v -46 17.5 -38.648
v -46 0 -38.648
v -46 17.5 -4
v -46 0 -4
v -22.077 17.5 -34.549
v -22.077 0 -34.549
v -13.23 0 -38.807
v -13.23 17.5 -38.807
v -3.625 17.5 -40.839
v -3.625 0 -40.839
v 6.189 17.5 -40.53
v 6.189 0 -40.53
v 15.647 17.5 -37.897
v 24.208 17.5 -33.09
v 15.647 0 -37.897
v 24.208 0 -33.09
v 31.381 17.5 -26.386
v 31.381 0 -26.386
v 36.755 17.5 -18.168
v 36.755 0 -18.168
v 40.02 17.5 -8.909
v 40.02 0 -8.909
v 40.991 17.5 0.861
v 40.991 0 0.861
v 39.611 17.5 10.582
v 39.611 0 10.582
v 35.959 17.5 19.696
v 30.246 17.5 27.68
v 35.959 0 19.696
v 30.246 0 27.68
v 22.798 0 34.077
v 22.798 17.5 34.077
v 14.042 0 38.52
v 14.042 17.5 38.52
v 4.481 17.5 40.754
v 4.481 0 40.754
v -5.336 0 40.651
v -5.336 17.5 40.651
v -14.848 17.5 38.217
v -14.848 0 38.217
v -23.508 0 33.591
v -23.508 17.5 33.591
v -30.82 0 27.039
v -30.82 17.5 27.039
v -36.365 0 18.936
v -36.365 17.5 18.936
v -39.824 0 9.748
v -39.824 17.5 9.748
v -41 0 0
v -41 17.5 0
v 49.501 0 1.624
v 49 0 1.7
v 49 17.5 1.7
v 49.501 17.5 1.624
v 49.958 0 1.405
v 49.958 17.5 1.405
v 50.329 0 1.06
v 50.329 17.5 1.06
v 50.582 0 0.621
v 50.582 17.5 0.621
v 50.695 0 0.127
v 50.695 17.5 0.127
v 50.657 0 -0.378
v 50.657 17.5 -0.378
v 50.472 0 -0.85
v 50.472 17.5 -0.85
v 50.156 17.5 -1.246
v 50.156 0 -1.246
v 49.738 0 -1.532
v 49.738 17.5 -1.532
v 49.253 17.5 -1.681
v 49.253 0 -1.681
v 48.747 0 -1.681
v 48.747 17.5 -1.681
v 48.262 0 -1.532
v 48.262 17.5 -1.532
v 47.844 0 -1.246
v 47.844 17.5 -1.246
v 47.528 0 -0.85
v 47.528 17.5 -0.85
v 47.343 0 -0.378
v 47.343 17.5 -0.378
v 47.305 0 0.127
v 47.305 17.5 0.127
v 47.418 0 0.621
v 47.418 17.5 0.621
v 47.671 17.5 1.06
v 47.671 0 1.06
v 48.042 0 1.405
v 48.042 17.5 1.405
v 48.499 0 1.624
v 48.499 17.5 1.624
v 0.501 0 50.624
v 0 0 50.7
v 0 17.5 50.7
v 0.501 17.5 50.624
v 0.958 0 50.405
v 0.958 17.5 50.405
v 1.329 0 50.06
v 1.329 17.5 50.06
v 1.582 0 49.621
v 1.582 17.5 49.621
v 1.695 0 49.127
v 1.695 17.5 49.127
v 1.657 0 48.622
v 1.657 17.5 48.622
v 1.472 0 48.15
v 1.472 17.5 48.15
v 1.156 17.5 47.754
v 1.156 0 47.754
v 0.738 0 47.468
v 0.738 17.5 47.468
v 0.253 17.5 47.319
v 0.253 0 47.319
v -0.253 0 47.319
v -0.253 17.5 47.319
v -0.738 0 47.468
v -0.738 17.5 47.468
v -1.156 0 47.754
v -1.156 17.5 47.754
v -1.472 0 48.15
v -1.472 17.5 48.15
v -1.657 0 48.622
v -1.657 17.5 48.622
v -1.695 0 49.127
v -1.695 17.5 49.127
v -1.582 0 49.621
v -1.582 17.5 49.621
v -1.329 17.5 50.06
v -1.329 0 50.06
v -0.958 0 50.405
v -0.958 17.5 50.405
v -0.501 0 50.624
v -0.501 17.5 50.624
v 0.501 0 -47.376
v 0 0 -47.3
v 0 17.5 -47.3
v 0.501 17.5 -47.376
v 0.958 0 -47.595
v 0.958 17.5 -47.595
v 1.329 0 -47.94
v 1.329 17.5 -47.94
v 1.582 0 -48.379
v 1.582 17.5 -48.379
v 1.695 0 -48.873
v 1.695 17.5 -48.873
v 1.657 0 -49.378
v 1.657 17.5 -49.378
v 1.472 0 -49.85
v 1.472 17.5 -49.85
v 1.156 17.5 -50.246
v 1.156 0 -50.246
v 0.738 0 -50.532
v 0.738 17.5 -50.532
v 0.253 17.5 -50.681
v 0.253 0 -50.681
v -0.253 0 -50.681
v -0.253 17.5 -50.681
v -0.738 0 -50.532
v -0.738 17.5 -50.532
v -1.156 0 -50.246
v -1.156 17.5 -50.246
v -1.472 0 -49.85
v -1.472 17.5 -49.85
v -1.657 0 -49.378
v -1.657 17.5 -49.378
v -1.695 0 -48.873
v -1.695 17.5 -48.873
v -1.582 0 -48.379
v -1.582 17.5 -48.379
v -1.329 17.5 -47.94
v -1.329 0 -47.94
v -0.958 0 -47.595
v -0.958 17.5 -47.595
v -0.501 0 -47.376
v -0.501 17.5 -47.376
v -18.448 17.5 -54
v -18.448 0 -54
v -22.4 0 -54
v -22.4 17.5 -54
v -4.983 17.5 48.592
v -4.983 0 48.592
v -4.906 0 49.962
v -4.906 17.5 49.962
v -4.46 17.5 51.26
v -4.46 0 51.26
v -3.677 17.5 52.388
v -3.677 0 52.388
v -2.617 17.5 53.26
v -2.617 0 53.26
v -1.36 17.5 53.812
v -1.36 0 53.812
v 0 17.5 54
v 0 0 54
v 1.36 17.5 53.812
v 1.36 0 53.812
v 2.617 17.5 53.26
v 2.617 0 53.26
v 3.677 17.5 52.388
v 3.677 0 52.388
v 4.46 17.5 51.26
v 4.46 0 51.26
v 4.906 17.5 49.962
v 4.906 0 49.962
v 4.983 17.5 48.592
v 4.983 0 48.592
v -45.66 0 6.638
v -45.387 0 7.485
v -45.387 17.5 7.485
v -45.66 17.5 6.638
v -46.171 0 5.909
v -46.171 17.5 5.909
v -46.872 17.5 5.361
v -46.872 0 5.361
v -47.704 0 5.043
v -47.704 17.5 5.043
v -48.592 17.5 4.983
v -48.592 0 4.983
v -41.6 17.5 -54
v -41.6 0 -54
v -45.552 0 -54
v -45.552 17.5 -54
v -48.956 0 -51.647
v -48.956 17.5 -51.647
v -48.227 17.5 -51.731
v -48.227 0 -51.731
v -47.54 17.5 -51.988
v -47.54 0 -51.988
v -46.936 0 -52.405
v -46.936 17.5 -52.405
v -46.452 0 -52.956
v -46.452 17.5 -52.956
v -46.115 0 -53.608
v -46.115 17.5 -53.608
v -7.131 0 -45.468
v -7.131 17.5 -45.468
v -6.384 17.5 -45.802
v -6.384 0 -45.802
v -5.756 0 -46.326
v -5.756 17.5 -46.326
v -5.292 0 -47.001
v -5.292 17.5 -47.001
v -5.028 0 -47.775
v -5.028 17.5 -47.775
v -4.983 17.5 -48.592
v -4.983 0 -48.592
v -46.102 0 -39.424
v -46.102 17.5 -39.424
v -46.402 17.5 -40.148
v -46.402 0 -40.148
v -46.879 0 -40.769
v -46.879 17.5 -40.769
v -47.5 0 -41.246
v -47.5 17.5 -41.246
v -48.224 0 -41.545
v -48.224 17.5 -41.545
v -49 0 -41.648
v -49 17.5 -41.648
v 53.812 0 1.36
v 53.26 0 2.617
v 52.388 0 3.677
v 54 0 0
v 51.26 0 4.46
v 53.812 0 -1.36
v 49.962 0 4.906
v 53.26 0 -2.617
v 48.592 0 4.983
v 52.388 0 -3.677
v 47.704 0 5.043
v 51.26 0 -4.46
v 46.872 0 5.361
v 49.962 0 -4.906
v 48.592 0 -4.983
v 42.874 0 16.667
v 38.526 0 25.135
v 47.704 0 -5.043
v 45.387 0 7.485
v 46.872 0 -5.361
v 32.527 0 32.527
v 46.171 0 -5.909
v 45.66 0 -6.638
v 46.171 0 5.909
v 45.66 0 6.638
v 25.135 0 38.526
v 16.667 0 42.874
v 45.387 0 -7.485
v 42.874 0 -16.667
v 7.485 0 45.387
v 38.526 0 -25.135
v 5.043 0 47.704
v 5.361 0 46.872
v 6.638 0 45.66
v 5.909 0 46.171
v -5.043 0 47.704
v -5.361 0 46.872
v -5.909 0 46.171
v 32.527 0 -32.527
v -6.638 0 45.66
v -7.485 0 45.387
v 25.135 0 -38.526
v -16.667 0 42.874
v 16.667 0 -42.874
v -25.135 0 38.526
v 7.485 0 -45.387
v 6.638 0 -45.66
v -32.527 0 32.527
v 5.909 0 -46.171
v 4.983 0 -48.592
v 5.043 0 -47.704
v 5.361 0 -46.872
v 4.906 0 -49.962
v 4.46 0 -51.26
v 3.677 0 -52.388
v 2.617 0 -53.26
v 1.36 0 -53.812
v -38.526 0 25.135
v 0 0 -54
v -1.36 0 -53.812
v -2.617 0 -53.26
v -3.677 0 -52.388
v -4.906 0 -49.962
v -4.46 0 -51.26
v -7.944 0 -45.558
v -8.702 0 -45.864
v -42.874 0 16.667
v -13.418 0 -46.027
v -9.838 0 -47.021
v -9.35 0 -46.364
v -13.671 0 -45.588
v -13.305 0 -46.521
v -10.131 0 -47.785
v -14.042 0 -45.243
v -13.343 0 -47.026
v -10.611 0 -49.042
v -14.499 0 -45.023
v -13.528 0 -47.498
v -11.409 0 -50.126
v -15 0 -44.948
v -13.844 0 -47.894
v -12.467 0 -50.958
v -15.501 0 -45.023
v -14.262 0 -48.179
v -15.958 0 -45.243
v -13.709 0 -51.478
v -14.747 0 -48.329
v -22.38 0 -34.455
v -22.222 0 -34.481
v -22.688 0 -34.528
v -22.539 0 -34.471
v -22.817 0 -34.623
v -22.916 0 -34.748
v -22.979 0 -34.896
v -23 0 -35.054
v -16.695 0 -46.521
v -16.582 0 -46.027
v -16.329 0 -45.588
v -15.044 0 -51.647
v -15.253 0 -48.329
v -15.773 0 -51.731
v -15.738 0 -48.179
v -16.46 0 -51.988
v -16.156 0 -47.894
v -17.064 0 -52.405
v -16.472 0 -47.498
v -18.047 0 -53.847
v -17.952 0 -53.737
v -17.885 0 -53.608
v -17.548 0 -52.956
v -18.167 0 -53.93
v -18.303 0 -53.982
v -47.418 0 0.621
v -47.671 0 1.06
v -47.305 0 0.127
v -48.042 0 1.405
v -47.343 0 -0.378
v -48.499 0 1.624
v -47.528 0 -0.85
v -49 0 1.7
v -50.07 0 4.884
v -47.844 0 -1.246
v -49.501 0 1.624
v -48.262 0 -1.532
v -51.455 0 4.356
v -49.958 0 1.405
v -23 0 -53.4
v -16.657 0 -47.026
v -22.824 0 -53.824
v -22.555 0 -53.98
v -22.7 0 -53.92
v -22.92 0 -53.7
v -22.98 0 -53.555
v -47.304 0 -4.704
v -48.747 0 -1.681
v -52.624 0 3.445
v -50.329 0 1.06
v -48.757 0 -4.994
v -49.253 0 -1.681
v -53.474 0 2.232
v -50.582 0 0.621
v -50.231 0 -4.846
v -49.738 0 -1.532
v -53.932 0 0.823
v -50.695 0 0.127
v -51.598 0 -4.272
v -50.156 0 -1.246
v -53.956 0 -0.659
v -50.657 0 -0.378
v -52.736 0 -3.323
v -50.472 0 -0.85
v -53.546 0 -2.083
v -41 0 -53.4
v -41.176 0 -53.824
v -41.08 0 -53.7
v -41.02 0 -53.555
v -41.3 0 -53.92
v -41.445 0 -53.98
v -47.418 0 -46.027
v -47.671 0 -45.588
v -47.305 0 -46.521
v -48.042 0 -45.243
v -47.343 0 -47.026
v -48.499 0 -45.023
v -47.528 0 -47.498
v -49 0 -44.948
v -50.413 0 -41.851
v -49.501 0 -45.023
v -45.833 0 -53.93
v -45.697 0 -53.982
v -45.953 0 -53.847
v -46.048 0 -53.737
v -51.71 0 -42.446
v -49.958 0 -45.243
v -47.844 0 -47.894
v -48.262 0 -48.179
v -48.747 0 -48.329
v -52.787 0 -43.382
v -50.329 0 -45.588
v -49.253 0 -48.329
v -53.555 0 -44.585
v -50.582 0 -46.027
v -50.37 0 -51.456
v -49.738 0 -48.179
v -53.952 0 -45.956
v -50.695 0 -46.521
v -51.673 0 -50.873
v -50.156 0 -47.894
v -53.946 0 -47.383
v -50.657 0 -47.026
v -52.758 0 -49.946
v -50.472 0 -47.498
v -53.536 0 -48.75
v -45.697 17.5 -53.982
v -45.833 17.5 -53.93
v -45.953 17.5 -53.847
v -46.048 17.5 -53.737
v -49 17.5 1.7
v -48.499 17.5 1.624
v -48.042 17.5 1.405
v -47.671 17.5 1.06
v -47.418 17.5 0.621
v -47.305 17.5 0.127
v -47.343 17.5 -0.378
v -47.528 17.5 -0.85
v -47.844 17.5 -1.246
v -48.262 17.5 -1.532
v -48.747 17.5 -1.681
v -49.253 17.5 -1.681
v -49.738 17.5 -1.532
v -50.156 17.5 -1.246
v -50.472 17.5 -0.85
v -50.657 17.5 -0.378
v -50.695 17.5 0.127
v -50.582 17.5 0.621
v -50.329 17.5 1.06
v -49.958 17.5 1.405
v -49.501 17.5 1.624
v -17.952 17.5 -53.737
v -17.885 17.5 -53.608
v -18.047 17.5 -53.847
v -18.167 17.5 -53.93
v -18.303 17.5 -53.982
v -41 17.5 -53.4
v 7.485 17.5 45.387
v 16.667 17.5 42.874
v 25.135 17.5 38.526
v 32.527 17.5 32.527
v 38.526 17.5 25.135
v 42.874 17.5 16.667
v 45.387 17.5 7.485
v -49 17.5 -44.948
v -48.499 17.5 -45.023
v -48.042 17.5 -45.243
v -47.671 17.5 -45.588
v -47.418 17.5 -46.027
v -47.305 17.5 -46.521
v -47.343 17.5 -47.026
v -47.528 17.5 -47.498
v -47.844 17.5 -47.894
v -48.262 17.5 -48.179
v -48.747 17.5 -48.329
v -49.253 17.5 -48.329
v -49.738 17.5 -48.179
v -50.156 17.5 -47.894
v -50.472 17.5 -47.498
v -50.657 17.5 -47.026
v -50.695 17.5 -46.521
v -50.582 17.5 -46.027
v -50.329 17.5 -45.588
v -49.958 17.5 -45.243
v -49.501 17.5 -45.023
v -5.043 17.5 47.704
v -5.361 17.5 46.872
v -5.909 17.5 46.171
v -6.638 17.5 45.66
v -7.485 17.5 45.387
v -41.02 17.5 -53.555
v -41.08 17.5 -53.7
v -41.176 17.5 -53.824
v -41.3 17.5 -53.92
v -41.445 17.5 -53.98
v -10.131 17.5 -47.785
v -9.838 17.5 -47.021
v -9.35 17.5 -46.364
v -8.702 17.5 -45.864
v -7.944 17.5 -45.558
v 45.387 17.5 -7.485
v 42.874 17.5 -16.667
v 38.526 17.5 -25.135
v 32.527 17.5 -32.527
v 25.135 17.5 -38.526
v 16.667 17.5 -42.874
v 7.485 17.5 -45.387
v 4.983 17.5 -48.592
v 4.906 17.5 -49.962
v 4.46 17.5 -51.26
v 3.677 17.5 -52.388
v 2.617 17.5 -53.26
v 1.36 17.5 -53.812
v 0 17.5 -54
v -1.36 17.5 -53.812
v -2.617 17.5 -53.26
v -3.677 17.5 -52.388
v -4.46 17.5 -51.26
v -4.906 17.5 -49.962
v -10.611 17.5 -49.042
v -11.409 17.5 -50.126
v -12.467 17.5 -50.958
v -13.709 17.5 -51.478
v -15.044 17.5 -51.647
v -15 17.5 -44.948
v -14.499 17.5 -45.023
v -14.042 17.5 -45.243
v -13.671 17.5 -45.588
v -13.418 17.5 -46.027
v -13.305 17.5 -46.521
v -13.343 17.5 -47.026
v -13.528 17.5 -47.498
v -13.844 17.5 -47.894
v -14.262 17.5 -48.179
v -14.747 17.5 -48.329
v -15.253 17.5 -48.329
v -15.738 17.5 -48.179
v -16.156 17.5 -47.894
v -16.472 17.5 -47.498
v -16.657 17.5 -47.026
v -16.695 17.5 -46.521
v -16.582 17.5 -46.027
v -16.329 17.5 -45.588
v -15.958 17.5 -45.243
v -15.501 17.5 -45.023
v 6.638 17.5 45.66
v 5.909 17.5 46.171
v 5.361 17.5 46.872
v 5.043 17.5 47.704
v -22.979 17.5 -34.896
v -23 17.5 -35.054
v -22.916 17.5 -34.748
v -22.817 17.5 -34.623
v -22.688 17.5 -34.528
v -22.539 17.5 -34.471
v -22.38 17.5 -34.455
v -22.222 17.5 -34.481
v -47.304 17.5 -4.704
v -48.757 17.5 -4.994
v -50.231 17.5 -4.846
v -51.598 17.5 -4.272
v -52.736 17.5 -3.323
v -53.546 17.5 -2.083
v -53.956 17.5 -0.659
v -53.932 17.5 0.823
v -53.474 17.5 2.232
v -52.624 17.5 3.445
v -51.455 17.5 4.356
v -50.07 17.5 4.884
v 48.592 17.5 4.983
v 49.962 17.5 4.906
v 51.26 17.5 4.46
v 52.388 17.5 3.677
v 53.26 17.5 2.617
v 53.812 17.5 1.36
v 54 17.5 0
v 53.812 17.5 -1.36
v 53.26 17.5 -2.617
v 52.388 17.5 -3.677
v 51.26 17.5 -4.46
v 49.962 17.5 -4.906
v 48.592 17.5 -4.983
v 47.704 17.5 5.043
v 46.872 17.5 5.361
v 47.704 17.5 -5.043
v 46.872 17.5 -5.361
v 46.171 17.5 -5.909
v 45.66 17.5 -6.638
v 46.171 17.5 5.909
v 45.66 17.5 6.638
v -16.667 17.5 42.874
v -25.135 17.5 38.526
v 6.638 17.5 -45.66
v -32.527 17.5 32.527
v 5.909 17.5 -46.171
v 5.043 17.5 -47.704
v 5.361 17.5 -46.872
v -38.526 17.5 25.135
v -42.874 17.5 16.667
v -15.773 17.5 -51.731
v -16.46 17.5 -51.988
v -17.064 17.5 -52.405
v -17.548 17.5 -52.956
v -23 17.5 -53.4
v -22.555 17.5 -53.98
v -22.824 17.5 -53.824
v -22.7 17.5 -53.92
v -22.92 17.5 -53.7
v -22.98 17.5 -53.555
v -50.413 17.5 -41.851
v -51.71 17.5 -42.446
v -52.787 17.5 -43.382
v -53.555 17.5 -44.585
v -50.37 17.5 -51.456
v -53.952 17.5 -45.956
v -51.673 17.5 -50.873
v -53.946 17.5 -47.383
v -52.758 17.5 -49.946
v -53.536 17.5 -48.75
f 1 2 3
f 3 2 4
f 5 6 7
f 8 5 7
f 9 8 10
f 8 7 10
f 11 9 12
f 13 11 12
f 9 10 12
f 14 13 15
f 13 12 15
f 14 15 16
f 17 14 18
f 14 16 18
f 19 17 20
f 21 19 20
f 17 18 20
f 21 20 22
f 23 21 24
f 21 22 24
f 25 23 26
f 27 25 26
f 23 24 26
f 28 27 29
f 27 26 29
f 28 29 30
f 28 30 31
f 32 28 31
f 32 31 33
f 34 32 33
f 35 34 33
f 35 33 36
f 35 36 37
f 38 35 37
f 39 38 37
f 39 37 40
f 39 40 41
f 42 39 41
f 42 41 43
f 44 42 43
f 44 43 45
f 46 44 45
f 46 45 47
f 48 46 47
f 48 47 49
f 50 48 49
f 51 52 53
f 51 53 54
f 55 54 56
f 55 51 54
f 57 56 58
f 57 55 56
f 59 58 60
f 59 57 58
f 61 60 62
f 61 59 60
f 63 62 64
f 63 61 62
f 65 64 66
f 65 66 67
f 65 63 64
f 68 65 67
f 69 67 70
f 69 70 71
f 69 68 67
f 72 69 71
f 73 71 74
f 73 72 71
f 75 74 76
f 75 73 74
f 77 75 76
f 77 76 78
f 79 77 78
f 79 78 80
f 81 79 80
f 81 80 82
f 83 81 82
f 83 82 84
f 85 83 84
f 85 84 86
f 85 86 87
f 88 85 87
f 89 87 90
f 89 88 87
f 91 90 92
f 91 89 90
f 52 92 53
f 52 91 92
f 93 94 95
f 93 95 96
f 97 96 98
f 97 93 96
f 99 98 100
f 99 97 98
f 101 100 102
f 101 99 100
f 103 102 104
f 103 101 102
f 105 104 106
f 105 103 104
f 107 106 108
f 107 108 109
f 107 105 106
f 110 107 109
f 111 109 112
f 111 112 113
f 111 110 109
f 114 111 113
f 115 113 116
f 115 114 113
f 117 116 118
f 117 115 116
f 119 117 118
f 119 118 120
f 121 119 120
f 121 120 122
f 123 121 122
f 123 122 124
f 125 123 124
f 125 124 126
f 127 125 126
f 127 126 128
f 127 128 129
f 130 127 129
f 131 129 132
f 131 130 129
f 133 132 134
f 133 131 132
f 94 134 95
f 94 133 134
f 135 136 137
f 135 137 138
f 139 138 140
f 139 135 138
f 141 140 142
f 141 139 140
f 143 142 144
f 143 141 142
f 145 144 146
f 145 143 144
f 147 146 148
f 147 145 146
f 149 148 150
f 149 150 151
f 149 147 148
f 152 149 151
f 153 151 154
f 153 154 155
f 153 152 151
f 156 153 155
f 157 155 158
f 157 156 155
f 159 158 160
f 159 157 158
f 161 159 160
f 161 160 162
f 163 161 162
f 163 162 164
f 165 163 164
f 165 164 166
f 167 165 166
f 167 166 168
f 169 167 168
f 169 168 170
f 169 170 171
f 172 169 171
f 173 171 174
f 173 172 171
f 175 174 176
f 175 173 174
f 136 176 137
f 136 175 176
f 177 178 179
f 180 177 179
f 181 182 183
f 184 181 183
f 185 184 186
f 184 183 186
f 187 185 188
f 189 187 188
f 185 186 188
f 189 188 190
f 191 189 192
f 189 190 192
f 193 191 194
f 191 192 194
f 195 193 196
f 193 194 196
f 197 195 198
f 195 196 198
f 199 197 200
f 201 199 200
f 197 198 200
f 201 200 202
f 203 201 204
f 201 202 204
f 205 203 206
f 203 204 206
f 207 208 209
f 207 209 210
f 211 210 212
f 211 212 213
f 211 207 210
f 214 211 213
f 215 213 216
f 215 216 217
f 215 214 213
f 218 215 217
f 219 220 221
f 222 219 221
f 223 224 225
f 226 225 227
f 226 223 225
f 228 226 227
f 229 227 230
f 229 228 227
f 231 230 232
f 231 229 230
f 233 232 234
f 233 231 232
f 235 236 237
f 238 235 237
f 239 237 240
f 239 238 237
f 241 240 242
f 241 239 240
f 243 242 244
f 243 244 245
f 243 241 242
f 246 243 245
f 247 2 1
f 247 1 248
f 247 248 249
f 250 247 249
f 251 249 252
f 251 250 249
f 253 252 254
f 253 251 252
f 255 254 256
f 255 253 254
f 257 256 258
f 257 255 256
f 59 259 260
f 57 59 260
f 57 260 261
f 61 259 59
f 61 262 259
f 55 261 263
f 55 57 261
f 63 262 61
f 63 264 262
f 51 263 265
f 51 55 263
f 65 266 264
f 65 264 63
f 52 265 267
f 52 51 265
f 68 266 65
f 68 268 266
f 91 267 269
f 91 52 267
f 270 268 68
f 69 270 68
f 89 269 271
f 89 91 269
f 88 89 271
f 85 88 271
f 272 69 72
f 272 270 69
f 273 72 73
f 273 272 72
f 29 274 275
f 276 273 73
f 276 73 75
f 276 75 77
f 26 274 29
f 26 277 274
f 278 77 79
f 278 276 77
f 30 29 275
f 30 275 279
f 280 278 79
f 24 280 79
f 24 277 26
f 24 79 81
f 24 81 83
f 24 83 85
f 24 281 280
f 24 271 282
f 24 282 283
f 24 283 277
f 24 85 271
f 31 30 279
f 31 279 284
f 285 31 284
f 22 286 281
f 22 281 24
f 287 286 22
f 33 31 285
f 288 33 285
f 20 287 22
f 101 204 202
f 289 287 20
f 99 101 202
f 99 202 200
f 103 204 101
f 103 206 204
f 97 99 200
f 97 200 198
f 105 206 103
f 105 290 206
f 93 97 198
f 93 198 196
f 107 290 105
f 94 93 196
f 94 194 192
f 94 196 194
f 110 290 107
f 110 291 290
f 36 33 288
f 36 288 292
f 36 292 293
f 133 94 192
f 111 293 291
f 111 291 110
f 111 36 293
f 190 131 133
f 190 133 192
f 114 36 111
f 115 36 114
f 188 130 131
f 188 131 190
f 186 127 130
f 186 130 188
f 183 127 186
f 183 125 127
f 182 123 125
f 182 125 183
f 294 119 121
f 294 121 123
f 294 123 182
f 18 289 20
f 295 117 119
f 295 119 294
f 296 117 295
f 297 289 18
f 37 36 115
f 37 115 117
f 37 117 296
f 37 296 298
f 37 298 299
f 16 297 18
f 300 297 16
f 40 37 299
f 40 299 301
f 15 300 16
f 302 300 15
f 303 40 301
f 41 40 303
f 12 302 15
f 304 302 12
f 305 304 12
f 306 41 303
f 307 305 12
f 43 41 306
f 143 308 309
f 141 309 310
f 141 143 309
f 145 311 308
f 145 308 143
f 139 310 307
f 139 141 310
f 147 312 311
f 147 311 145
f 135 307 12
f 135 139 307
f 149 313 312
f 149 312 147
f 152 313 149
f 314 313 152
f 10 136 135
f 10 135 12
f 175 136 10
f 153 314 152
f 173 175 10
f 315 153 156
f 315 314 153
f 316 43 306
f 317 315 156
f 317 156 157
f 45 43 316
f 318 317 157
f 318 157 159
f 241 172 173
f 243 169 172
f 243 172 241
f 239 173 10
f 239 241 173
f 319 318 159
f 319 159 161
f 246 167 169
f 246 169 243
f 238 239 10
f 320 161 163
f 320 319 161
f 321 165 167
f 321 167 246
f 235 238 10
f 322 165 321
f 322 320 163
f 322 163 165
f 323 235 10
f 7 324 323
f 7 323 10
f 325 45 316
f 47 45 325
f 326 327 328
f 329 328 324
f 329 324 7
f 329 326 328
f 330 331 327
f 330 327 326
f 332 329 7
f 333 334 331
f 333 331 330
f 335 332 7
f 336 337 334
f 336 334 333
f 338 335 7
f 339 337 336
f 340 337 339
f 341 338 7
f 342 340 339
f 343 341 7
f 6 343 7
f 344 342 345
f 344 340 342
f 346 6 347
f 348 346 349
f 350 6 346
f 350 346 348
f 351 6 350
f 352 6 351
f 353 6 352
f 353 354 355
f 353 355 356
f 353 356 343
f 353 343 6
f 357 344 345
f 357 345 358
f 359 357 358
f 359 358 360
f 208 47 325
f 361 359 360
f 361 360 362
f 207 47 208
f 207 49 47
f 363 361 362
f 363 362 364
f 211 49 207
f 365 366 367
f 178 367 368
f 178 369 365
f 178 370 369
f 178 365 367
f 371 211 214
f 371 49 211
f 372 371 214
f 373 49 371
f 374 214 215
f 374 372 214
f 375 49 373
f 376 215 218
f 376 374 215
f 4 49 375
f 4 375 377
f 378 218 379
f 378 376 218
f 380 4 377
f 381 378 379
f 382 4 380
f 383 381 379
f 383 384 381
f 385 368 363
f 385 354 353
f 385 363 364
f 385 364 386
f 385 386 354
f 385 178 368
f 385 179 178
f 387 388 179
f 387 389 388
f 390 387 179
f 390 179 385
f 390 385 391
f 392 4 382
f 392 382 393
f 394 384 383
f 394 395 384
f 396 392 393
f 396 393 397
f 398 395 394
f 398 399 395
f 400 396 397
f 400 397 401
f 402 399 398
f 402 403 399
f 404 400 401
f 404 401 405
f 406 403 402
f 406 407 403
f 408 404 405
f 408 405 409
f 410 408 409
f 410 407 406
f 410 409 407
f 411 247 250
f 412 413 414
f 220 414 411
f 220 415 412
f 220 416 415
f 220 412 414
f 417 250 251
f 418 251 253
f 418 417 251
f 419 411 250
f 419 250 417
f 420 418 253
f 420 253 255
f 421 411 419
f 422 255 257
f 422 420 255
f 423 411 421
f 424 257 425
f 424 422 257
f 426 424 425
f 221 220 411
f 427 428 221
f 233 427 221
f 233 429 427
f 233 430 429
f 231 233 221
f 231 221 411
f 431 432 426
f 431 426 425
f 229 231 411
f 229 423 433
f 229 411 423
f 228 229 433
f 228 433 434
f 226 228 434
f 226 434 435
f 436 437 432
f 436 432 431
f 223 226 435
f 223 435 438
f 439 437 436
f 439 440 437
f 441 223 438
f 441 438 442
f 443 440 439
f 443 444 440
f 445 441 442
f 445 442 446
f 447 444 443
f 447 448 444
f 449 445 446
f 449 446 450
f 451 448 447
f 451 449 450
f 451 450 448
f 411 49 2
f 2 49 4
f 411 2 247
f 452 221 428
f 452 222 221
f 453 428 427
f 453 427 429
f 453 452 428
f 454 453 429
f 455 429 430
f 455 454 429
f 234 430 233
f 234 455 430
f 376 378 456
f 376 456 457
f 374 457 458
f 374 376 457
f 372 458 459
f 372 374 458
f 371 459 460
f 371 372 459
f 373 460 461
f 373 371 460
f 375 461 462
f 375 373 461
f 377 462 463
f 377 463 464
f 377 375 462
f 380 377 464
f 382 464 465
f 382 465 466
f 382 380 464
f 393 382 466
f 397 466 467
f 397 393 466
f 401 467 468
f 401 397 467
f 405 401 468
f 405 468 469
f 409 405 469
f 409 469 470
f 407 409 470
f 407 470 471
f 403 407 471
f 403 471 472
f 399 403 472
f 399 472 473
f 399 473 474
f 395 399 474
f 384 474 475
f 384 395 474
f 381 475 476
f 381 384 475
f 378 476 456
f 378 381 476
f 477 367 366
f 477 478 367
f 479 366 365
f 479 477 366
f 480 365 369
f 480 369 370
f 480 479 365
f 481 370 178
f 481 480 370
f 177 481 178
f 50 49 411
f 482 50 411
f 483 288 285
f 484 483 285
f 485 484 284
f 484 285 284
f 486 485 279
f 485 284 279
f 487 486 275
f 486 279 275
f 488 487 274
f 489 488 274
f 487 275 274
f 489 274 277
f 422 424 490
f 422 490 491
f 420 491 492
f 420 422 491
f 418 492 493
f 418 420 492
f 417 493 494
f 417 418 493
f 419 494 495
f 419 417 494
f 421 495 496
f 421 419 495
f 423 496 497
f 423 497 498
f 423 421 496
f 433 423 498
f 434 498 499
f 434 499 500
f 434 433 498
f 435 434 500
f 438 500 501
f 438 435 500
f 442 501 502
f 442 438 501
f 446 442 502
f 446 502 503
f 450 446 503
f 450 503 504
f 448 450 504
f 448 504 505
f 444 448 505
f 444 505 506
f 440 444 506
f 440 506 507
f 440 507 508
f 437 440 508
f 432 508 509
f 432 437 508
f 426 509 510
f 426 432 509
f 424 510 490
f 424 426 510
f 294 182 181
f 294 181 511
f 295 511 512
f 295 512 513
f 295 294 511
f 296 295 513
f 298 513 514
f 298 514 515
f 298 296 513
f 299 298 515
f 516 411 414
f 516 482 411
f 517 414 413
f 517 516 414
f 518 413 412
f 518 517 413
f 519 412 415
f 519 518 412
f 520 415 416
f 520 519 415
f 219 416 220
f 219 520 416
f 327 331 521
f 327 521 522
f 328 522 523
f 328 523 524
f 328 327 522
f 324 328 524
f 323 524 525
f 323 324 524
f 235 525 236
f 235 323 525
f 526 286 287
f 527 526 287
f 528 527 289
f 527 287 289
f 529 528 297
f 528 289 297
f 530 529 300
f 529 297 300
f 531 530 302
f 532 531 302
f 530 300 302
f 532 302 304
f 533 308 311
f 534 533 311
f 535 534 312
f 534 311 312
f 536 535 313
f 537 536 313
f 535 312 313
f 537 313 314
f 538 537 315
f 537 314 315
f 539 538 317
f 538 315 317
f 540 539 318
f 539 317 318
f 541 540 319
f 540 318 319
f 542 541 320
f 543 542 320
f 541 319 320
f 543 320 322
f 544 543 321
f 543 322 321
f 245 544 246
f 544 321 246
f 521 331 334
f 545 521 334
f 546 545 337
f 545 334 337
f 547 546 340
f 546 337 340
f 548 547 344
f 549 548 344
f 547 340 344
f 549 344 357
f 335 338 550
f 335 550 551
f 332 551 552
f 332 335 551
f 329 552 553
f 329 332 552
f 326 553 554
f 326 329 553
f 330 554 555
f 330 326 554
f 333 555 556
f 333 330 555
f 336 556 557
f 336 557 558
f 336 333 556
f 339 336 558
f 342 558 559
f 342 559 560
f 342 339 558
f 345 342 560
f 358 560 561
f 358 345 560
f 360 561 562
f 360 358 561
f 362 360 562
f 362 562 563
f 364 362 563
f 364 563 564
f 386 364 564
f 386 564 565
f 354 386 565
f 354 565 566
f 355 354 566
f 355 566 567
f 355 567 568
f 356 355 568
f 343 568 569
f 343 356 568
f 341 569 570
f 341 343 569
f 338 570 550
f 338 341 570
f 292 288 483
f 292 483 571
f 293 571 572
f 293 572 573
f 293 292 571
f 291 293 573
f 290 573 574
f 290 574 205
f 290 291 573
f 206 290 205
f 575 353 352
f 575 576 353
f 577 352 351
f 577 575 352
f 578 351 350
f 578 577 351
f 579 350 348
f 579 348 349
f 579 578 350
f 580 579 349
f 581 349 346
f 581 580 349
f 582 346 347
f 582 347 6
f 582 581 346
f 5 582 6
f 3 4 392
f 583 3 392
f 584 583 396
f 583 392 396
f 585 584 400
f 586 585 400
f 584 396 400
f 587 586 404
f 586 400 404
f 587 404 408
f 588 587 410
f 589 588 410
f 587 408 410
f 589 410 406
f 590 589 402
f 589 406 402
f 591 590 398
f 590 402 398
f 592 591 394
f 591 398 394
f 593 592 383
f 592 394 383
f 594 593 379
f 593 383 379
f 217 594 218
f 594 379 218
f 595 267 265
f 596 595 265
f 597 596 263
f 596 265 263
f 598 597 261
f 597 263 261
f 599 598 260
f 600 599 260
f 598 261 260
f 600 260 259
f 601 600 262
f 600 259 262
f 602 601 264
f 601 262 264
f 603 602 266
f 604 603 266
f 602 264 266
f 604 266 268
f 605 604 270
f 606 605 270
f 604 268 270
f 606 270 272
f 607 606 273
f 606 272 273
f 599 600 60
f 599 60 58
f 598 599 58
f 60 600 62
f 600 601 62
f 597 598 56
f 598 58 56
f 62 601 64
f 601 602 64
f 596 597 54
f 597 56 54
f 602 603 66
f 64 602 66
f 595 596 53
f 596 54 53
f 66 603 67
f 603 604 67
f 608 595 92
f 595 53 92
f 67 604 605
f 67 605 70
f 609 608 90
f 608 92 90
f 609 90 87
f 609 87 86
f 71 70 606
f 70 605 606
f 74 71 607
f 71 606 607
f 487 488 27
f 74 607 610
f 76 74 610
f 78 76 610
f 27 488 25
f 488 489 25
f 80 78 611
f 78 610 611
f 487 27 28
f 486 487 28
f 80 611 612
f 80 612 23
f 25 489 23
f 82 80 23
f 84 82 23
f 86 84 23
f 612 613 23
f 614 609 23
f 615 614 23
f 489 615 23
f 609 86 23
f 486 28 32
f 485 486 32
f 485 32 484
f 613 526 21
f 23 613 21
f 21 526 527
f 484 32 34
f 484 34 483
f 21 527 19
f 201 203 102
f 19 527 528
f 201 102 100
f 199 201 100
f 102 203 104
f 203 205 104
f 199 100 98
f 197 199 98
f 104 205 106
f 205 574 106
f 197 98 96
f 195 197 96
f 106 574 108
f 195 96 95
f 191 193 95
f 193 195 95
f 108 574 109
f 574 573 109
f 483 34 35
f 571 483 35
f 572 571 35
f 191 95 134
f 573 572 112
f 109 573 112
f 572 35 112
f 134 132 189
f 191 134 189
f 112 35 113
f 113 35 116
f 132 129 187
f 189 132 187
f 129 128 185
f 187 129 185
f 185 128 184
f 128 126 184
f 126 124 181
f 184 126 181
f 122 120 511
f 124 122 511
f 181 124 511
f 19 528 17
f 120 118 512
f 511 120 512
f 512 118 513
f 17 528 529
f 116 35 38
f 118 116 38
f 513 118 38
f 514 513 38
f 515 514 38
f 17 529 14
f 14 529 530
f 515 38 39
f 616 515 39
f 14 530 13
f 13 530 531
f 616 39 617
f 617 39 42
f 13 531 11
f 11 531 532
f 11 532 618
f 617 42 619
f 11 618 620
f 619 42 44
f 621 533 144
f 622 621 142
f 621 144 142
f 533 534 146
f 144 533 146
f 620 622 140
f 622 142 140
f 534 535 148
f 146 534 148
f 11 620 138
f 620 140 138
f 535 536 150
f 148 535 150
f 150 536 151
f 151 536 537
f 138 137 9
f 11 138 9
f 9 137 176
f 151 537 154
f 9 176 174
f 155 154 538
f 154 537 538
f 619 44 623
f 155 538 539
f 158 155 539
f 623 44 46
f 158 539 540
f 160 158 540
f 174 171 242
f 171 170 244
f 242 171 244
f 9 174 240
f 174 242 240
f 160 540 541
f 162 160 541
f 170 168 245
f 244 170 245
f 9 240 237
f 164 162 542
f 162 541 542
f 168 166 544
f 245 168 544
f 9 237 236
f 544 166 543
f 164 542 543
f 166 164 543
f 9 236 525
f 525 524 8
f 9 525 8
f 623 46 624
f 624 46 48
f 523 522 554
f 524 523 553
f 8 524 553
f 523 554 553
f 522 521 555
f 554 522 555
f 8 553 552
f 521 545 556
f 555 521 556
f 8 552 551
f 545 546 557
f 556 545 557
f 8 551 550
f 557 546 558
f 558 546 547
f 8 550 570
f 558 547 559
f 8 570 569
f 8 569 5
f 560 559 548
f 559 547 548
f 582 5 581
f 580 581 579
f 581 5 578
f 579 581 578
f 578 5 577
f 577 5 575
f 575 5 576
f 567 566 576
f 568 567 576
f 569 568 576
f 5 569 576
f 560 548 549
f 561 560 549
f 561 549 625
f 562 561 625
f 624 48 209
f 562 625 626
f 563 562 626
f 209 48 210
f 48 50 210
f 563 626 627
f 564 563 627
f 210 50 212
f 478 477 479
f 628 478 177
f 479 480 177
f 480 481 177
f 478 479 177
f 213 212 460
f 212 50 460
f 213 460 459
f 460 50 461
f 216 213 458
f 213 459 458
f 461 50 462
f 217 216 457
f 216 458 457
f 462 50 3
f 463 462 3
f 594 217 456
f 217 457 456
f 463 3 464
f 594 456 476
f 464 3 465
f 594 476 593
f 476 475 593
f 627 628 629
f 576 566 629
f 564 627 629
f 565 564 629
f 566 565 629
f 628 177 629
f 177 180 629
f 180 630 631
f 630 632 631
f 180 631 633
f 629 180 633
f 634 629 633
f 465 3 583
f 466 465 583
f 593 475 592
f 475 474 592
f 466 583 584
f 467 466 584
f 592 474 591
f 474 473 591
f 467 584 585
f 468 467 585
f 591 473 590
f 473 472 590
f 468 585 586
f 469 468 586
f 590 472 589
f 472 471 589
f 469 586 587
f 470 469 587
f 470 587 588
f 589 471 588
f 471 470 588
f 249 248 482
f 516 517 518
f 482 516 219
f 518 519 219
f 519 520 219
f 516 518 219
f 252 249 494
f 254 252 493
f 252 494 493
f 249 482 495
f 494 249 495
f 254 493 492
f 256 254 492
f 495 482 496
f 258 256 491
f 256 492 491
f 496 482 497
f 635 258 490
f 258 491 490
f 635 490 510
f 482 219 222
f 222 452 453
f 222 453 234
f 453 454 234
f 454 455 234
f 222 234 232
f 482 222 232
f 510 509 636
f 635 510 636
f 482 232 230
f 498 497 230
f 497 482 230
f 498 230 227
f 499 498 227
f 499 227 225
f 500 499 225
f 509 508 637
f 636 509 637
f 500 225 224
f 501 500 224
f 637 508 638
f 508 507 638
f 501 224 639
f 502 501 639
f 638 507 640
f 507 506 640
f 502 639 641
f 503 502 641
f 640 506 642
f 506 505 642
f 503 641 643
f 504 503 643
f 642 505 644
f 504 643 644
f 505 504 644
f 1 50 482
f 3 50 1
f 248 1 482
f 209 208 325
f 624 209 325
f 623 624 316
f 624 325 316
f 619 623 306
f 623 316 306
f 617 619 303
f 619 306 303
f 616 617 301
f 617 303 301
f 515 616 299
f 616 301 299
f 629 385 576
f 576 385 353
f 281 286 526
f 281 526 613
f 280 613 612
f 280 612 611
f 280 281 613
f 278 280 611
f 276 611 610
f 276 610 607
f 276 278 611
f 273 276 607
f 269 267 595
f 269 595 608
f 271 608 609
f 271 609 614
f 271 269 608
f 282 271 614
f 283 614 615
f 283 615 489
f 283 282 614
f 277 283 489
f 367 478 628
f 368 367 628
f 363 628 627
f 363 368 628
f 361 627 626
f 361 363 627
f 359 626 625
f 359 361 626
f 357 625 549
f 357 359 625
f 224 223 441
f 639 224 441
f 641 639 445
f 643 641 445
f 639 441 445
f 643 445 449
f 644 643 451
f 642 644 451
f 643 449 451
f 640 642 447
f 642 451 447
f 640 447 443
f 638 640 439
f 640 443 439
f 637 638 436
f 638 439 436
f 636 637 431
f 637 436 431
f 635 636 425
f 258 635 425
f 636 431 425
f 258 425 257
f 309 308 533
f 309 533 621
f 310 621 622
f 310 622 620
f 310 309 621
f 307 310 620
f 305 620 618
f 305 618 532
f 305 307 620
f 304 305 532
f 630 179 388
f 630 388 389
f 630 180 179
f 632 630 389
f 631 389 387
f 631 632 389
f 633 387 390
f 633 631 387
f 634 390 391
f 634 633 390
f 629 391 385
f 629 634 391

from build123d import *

# Parameters (mm, degrees)
SKETCH_1_R      = 1.7
EXTRUDE_1_DEPTH = 17.5
FILLET_1_R      = 3
FILLET_2_R      = 0.6


with BuildPart() as part:
    # 草图1 → 凸台-拉伸1 (new body)
    with BuildSketch(Plane(origin=(0, 0, 0), x_dir=(1, 0, 0), z_dir=(0, 1, 0))):
        with BuildLine():
            Line((-41, 0), (-41, 54))
            Line((-41, 54), (-46, 54))
            Line((-46, 54), (-46, 50.647615159))
            ThreePointArc((-46, 50.647615159), (-54, 46.647615159), (-46, 42.647615159))
            Line((-46, 42.647615159), (-46, 4))
            ThreePointArc((-46, 4), (-53.998925026, -0.103675394), (-45.836734694, -3.872176727))
            ThreePointArc((-45.836734694, -3.872176727), (-32.526911935, -32.526911935), (-3.872176727, -45.836734694))
            ThreePointArc((-3.872176727, -45.836734694), (0, -54), (3.872176727, -45.836734694))
            ThreePointArc((3.872176727, -45.836734694), (32.526911935, -32.526911935), (45.836734694, -3.872176727))
            ThreePointArc((45.836734694, -3.872176727), (54, 0), (45.836734694, 3.872176727))
            ThreePointArc((45.836734694, 3.872176727), (32.526911935, 32.526911935), (3.872176727, 45.836734694))
            ThreePointArc((3.872176727, 45.836734694), (0, 54), (-3.872176727, 45.836734694))
            ThreePointArc((-3.872176727, 45.836734694), (-7.126872346, 45.444556226), (-10.345371646, 44.821571654))
            ThreePointArc((-10.345371646, 44.821571654), (-11.971775359, 50.626290255), (-18, 50.647615159))
            Line((-18, 50.647615159), (-18, 54))
            Line((-18, 54), (-23, 54))
            Line((-23, 54), (-23, 33.941125497))
            ThreePointArc((-23, 33.941125497), (36.221540553, -19.209372712), (-41, 0))
        make_face()
        with Locations(Location((0, 49, 0), (0, 0, 270))):
            Circle(SKETCH_1_R, mode=Mode.SUBTRACT)
        with Locations(Location((49, 0, 0), (0, 0, 270))):
            Circle(SKETCH_1_R, mode=Mode.SUBTRACT)
        with Locations(Location((0, -49, 0), (0, 0, 270))):
            Circle(SKETCH_1_R, mode=Mode.SUBTRACT)
        with Locations(Location((-49, 0, 0), (0, 0, 270))):
            Circle(SKETCH_1_R, mode=Mode.SUBTRACT)
        with Locations(Location((-15, 46.647615159, 0), (0, 0, 270))):
            Circle(SKETCH_1_R, mode=Mode.SUBTRACT)
        with Locations(Location((-49, 46.647615159, 0), (0, 0, 270))):
            Circle(SKETCH_1_R, mode=Mode.SUBTRACT)
    extrude(amount=EXTRUDE_1_DEPTH)

    # 圆角1
    # the kernel refuses this fillet: 3 mm, written as the material it adds along each edge
    with BuildSketch(Plane(origin=(-3.872176727, 0, -45.836734694), x_dir=(-0.37402840247840613, 0, -0.9274172492138861), z_dir=(0, 1, 0)), Plane(origin=(45.836734694, 0, -3.872176727), x_dir=(0.9274172492138857, 0, -0.37402840247840763), z_dir=(0, 1, 0)), Plane(origin=(3.872176727, 0, 45.836734694), x_dir=(0.374028402478409, 0, 0.9274172492138849), z_dir=(0, 1, 0)), Plane(origin=(-45.836734694, 0, 3.872176727), x_dir=(-0.9274172492138864, 0, 0.3740284024784056), z_dir=(0, 1, 0))) as fillet_1_piece_1:
        with BuildLine():
            CenterArc((3.861943107, 2.864564734), FILLET_1_R, 167.400558819, 85.317583138)
            Line((0.934186439, 3.518965904), (0.875631305, 3.532053927))
            ThreePointArc((0.875631305, 3.532053927), (0.44393089, 1.765631899), (-0.057336629, 0.017677979))
            Line((-0.057336629, 0.017677979), (0.017824353, -0.057291295))
            ThreePointArc((0.017824353, -0.057291295), (1.485362734, 0.165725443), (2.952901114, -0.057291295))
            Line((2.952901114, -0.057291295), (2.970725467, 0))
        make_face()
    extrude(amount=17.5)
    with BuildSketch(Plane(origin=(3.872176727, 0, -45.836734694), x_dir=(0.9923388633046951, 0, 0.12354586344813656), z_dir=(0, 1, 0)), Plane(origin=(45.836734694, 0, 3.872176727), x_dir=(-0.12354586344813612, 0, 0.9923388633046951), z_dir=(0, 1, 0)), Plane(origin=(-3.872176727, 0, 45.836734694), x_dir=(-0.9923388633046952, 0, -0.12354586344813587), z_dir=(0, 1, 0)), Plane(origin=(-10.345371646, 0, -44.821571654), x_dir=(0.982518966413127, 0, -0.18616251136703332), z_dir=(0, 1, 0))) as fillet_1_piece_2:
        with BuildLine():
            CenterArc((3.759578561, 2.997649867), FILLET_1_R, 182.41437212, 85.317583138)
            Line((0.762241678, 2.871271047), (0.70229494, 2.868743471))
            ThreePointArc((0.70229494, 2.868743471), (0.541298099, 1.393112968), (-0.050799838, 0.031927676))
            Line((-0.050799838, 0.031927676), (0.002374471, -0.059952997))
            ThreePointArc((0.002374471, -0.059952997), (1.820427514, -0.023964621), (3.638480557, -0.059952997))
            Line((3.638480557, -0.059952997), (3.640855028, 0))
        make_face()
    extrude(amount=17.5)
    with BuildSketch(Plane(origin=(-46, 0, -42.647615159), x_dir=(-0.9486832980505127, 0, 0.31622776601684127), z_dir=(0, 1, 0))) as fillet_1_piece_3:
        with BuildLine():
            CenterArc((4.110960958, 2.846049894), FILLET_1_R, 161.565051177, 90)
            Line((1.264911064, 3.794733192), (1.207990066, 3.813706858))
            Line((1.207990066, 3.813706858), (-0.056920998, 0.018973666))
            Line((-0.056920998, 0.018973666), (0.018973666, -0.056920998))
            ThreePointArc((0.018973666, -0.056920998), (1.58113883, 0.19658351), (3.143303994, -0.056920998))
            Line((3.143303994, -0.056920998), (3.16227766, 0))
        make_face()
    extrude(amount=17.5)
    with BuildSketch(Plane(origin=(-46, 0, -50.647615159), x_dir=(1.5090941279718801e-12, 0, -1.0), z_dir=(0, 1, 0))) as fillet_1_piece_4:
        with BuildLine():
            CenterArc((3.99968789, 2.929334184), FILLET_1_R, 179.493886793, 78.04554374)
            Line((0.999804931, 2.955833865), (0.939807272, 2.956363859))
            ThreePointArc((0.939807272, 2.956363859), (0.679550236, 1.417151431), (-0.048, 0.036))
            Line((-0.048, 0.036), (0, -0.06))
            ThreePointArc((0, -0.06), (1.676192421, -0.06), (3.33943878, -0.058586684))
            Line((3.33943878, -0.058586684), (3.352384841, 0))
        make_face()
    extrude(amount=17.5)
    with BuildSketch(Plane(origin=(-18, 0, -50.647615159), x_dir=(0.9472773756522823, 0, -0.3204146900148692), z_dir=(0, 1, 0))) as fillet_1_piece_5:
        with BuildLine():
            CenterArc((4.056450754, 2.850212144), FILLET_1_R, 173.772564041, 78.04554374)
            Line((1.07415335, 3.175638315), (1.014507402, 3.182146838))
            ThreePointArc((1.014507402, 3.182146838), (0.480240032, 1.607044039), (-0.056836643, 0.019224881))
            Line((-0.056836643, 0.019224881), (0.01872208, -0.057004243))
            ThreePointArc((0.01872208, -0.057004243), (1.560173367, 0.189646427), (3.101624653, -0.057004243))
            Line((3.101624653, -0.057004243), (3.120346734, 0))
        make_face()
    extrude(amount=17.5)

    # 圆角2
    fillet_2_edges = [part.edges().sort_by_distance(p)[0] for p in [
        (-46, 8.75, -54),
        (-41, 8.75, -54),
        (-23, 8.75, -33.941125497),
        (-23, 8.75, -54),
        (-18, 8.75, -54),
    ]]
    fillet(fillet_2_edges, radius=FILLET_2_R)


solid = part.part
